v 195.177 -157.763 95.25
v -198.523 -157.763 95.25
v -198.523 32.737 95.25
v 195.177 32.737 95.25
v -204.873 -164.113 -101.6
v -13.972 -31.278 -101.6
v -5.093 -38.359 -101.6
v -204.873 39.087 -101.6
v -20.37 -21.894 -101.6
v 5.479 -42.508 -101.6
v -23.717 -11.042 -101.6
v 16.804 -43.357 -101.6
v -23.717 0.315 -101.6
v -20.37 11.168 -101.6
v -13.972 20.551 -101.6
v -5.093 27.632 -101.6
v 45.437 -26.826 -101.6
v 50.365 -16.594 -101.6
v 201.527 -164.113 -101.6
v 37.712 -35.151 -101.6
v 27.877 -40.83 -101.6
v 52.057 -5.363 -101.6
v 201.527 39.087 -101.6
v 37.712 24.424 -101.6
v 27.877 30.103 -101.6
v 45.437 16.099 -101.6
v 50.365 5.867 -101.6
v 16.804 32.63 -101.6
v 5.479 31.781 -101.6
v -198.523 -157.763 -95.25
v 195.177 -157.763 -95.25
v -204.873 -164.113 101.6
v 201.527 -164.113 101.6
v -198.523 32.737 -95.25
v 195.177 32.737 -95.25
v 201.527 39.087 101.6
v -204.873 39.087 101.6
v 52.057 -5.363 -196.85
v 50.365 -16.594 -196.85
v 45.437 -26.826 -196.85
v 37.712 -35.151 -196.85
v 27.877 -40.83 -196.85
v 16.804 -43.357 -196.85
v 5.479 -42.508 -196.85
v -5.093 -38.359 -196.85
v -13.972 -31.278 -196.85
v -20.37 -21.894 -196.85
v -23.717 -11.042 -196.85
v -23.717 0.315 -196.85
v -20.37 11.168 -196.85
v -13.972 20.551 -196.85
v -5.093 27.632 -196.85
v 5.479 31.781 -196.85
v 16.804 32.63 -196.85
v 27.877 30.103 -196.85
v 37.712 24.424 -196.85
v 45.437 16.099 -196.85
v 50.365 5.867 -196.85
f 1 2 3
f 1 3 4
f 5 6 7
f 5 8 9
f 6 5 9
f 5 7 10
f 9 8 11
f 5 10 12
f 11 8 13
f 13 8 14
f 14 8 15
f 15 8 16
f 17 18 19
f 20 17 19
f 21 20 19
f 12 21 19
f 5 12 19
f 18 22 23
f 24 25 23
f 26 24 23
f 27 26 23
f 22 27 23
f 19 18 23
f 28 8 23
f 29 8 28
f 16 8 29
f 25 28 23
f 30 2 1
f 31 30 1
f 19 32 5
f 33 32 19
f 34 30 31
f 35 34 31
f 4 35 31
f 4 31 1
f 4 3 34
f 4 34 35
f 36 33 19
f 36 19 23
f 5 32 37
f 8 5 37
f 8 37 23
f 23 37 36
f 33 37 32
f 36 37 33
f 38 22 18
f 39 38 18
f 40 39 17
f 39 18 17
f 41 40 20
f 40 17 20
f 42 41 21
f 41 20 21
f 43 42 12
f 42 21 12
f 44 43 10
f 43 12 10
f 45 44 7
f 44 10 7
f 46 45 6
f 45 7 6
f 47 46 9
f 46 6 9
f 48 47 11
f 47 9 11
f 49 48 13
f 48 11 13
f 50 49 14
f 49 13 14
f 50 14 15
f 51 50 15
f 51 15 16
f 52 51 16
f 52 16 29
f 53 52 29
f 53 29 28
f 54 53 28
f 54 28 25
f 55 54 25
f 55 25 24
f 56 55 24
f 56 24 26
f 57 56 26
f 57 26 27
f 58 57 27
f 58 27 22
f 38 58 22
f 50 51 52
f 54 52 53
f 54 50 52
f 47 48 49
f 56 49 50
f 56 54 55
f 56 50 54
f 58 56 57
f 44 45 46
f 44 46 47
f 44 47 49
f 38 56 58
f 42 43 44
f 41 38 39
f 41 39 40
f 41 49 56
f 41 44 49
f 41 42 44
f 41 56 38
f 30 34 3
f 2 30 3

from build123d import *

# Parameters (mm, degrees)
F0_W      = 406.4
F0_H      = 203.2
F1_DEPTH  = 101.6
F4_W      = 393.7
F4_H      = 190.5
F5_DEPTH  = 190.5
F6_R      = 38.1
F7_DEPTH  = 6.35
F10_DEPTH = 101.6


# Not quite as in the source:
# - the program builds the solid bodies; features that only make, move or delete a surface that nothing else refers to are left out


with BuildPart() as f1:
    # F0 (on Top) → F1 (new body, symmetric)
    with BuildSketch(Plane.XY):
        with Locations((-1.672681421, -62.5133958211)):
            Rectangle(F0_W, F0_H)
    extrude(amount=F1_DEPTH, both=True)

    # F4 (on offset) → F5 (cut)
    with BuildSketch(Plane.XZ.offset(157.7633958211)):
        with Locations((-1.672681421, 0)):
            Rectangle(F4_W, F4_H)
    extrude(amount=-F5_DEPTH, mode=Mode.SUBTRACT)

    # F6 (on face) → F7 (cut, through all)
    with BuildSketch(Plane(origin=(0, 0, -101.6), x_dir=(1, 0, 0), z_dir=(0, 0, -1))):
        with Locations((13.9572741464, 5.3633958211)):
            Circle(F6_R)
    extrude(amount=-F7_DEPTH, mode=Mode.SUBTRACT)

    # F9 (on offset) → F10 (join)
    with BuildSketch(Plane(origin=(0, 0, -95.25), x_dir=(1, 0, 0), z_dir=(0, 0, -1))):
        with BuildLine():
            ThreePointArc((13.9572742307, -32.7366041789), (40.8980425394, -21.5773725123), (52.0572741464, 5.3633958211))
            ThreePointArc((52.0572741464, 5.3633958211), (-12.9834942466, 32.3041641545), (13.9572742307, -32.7366041789))
        make_face()
    extrude(amount=F10_DEPTH)


solid = f1.part
